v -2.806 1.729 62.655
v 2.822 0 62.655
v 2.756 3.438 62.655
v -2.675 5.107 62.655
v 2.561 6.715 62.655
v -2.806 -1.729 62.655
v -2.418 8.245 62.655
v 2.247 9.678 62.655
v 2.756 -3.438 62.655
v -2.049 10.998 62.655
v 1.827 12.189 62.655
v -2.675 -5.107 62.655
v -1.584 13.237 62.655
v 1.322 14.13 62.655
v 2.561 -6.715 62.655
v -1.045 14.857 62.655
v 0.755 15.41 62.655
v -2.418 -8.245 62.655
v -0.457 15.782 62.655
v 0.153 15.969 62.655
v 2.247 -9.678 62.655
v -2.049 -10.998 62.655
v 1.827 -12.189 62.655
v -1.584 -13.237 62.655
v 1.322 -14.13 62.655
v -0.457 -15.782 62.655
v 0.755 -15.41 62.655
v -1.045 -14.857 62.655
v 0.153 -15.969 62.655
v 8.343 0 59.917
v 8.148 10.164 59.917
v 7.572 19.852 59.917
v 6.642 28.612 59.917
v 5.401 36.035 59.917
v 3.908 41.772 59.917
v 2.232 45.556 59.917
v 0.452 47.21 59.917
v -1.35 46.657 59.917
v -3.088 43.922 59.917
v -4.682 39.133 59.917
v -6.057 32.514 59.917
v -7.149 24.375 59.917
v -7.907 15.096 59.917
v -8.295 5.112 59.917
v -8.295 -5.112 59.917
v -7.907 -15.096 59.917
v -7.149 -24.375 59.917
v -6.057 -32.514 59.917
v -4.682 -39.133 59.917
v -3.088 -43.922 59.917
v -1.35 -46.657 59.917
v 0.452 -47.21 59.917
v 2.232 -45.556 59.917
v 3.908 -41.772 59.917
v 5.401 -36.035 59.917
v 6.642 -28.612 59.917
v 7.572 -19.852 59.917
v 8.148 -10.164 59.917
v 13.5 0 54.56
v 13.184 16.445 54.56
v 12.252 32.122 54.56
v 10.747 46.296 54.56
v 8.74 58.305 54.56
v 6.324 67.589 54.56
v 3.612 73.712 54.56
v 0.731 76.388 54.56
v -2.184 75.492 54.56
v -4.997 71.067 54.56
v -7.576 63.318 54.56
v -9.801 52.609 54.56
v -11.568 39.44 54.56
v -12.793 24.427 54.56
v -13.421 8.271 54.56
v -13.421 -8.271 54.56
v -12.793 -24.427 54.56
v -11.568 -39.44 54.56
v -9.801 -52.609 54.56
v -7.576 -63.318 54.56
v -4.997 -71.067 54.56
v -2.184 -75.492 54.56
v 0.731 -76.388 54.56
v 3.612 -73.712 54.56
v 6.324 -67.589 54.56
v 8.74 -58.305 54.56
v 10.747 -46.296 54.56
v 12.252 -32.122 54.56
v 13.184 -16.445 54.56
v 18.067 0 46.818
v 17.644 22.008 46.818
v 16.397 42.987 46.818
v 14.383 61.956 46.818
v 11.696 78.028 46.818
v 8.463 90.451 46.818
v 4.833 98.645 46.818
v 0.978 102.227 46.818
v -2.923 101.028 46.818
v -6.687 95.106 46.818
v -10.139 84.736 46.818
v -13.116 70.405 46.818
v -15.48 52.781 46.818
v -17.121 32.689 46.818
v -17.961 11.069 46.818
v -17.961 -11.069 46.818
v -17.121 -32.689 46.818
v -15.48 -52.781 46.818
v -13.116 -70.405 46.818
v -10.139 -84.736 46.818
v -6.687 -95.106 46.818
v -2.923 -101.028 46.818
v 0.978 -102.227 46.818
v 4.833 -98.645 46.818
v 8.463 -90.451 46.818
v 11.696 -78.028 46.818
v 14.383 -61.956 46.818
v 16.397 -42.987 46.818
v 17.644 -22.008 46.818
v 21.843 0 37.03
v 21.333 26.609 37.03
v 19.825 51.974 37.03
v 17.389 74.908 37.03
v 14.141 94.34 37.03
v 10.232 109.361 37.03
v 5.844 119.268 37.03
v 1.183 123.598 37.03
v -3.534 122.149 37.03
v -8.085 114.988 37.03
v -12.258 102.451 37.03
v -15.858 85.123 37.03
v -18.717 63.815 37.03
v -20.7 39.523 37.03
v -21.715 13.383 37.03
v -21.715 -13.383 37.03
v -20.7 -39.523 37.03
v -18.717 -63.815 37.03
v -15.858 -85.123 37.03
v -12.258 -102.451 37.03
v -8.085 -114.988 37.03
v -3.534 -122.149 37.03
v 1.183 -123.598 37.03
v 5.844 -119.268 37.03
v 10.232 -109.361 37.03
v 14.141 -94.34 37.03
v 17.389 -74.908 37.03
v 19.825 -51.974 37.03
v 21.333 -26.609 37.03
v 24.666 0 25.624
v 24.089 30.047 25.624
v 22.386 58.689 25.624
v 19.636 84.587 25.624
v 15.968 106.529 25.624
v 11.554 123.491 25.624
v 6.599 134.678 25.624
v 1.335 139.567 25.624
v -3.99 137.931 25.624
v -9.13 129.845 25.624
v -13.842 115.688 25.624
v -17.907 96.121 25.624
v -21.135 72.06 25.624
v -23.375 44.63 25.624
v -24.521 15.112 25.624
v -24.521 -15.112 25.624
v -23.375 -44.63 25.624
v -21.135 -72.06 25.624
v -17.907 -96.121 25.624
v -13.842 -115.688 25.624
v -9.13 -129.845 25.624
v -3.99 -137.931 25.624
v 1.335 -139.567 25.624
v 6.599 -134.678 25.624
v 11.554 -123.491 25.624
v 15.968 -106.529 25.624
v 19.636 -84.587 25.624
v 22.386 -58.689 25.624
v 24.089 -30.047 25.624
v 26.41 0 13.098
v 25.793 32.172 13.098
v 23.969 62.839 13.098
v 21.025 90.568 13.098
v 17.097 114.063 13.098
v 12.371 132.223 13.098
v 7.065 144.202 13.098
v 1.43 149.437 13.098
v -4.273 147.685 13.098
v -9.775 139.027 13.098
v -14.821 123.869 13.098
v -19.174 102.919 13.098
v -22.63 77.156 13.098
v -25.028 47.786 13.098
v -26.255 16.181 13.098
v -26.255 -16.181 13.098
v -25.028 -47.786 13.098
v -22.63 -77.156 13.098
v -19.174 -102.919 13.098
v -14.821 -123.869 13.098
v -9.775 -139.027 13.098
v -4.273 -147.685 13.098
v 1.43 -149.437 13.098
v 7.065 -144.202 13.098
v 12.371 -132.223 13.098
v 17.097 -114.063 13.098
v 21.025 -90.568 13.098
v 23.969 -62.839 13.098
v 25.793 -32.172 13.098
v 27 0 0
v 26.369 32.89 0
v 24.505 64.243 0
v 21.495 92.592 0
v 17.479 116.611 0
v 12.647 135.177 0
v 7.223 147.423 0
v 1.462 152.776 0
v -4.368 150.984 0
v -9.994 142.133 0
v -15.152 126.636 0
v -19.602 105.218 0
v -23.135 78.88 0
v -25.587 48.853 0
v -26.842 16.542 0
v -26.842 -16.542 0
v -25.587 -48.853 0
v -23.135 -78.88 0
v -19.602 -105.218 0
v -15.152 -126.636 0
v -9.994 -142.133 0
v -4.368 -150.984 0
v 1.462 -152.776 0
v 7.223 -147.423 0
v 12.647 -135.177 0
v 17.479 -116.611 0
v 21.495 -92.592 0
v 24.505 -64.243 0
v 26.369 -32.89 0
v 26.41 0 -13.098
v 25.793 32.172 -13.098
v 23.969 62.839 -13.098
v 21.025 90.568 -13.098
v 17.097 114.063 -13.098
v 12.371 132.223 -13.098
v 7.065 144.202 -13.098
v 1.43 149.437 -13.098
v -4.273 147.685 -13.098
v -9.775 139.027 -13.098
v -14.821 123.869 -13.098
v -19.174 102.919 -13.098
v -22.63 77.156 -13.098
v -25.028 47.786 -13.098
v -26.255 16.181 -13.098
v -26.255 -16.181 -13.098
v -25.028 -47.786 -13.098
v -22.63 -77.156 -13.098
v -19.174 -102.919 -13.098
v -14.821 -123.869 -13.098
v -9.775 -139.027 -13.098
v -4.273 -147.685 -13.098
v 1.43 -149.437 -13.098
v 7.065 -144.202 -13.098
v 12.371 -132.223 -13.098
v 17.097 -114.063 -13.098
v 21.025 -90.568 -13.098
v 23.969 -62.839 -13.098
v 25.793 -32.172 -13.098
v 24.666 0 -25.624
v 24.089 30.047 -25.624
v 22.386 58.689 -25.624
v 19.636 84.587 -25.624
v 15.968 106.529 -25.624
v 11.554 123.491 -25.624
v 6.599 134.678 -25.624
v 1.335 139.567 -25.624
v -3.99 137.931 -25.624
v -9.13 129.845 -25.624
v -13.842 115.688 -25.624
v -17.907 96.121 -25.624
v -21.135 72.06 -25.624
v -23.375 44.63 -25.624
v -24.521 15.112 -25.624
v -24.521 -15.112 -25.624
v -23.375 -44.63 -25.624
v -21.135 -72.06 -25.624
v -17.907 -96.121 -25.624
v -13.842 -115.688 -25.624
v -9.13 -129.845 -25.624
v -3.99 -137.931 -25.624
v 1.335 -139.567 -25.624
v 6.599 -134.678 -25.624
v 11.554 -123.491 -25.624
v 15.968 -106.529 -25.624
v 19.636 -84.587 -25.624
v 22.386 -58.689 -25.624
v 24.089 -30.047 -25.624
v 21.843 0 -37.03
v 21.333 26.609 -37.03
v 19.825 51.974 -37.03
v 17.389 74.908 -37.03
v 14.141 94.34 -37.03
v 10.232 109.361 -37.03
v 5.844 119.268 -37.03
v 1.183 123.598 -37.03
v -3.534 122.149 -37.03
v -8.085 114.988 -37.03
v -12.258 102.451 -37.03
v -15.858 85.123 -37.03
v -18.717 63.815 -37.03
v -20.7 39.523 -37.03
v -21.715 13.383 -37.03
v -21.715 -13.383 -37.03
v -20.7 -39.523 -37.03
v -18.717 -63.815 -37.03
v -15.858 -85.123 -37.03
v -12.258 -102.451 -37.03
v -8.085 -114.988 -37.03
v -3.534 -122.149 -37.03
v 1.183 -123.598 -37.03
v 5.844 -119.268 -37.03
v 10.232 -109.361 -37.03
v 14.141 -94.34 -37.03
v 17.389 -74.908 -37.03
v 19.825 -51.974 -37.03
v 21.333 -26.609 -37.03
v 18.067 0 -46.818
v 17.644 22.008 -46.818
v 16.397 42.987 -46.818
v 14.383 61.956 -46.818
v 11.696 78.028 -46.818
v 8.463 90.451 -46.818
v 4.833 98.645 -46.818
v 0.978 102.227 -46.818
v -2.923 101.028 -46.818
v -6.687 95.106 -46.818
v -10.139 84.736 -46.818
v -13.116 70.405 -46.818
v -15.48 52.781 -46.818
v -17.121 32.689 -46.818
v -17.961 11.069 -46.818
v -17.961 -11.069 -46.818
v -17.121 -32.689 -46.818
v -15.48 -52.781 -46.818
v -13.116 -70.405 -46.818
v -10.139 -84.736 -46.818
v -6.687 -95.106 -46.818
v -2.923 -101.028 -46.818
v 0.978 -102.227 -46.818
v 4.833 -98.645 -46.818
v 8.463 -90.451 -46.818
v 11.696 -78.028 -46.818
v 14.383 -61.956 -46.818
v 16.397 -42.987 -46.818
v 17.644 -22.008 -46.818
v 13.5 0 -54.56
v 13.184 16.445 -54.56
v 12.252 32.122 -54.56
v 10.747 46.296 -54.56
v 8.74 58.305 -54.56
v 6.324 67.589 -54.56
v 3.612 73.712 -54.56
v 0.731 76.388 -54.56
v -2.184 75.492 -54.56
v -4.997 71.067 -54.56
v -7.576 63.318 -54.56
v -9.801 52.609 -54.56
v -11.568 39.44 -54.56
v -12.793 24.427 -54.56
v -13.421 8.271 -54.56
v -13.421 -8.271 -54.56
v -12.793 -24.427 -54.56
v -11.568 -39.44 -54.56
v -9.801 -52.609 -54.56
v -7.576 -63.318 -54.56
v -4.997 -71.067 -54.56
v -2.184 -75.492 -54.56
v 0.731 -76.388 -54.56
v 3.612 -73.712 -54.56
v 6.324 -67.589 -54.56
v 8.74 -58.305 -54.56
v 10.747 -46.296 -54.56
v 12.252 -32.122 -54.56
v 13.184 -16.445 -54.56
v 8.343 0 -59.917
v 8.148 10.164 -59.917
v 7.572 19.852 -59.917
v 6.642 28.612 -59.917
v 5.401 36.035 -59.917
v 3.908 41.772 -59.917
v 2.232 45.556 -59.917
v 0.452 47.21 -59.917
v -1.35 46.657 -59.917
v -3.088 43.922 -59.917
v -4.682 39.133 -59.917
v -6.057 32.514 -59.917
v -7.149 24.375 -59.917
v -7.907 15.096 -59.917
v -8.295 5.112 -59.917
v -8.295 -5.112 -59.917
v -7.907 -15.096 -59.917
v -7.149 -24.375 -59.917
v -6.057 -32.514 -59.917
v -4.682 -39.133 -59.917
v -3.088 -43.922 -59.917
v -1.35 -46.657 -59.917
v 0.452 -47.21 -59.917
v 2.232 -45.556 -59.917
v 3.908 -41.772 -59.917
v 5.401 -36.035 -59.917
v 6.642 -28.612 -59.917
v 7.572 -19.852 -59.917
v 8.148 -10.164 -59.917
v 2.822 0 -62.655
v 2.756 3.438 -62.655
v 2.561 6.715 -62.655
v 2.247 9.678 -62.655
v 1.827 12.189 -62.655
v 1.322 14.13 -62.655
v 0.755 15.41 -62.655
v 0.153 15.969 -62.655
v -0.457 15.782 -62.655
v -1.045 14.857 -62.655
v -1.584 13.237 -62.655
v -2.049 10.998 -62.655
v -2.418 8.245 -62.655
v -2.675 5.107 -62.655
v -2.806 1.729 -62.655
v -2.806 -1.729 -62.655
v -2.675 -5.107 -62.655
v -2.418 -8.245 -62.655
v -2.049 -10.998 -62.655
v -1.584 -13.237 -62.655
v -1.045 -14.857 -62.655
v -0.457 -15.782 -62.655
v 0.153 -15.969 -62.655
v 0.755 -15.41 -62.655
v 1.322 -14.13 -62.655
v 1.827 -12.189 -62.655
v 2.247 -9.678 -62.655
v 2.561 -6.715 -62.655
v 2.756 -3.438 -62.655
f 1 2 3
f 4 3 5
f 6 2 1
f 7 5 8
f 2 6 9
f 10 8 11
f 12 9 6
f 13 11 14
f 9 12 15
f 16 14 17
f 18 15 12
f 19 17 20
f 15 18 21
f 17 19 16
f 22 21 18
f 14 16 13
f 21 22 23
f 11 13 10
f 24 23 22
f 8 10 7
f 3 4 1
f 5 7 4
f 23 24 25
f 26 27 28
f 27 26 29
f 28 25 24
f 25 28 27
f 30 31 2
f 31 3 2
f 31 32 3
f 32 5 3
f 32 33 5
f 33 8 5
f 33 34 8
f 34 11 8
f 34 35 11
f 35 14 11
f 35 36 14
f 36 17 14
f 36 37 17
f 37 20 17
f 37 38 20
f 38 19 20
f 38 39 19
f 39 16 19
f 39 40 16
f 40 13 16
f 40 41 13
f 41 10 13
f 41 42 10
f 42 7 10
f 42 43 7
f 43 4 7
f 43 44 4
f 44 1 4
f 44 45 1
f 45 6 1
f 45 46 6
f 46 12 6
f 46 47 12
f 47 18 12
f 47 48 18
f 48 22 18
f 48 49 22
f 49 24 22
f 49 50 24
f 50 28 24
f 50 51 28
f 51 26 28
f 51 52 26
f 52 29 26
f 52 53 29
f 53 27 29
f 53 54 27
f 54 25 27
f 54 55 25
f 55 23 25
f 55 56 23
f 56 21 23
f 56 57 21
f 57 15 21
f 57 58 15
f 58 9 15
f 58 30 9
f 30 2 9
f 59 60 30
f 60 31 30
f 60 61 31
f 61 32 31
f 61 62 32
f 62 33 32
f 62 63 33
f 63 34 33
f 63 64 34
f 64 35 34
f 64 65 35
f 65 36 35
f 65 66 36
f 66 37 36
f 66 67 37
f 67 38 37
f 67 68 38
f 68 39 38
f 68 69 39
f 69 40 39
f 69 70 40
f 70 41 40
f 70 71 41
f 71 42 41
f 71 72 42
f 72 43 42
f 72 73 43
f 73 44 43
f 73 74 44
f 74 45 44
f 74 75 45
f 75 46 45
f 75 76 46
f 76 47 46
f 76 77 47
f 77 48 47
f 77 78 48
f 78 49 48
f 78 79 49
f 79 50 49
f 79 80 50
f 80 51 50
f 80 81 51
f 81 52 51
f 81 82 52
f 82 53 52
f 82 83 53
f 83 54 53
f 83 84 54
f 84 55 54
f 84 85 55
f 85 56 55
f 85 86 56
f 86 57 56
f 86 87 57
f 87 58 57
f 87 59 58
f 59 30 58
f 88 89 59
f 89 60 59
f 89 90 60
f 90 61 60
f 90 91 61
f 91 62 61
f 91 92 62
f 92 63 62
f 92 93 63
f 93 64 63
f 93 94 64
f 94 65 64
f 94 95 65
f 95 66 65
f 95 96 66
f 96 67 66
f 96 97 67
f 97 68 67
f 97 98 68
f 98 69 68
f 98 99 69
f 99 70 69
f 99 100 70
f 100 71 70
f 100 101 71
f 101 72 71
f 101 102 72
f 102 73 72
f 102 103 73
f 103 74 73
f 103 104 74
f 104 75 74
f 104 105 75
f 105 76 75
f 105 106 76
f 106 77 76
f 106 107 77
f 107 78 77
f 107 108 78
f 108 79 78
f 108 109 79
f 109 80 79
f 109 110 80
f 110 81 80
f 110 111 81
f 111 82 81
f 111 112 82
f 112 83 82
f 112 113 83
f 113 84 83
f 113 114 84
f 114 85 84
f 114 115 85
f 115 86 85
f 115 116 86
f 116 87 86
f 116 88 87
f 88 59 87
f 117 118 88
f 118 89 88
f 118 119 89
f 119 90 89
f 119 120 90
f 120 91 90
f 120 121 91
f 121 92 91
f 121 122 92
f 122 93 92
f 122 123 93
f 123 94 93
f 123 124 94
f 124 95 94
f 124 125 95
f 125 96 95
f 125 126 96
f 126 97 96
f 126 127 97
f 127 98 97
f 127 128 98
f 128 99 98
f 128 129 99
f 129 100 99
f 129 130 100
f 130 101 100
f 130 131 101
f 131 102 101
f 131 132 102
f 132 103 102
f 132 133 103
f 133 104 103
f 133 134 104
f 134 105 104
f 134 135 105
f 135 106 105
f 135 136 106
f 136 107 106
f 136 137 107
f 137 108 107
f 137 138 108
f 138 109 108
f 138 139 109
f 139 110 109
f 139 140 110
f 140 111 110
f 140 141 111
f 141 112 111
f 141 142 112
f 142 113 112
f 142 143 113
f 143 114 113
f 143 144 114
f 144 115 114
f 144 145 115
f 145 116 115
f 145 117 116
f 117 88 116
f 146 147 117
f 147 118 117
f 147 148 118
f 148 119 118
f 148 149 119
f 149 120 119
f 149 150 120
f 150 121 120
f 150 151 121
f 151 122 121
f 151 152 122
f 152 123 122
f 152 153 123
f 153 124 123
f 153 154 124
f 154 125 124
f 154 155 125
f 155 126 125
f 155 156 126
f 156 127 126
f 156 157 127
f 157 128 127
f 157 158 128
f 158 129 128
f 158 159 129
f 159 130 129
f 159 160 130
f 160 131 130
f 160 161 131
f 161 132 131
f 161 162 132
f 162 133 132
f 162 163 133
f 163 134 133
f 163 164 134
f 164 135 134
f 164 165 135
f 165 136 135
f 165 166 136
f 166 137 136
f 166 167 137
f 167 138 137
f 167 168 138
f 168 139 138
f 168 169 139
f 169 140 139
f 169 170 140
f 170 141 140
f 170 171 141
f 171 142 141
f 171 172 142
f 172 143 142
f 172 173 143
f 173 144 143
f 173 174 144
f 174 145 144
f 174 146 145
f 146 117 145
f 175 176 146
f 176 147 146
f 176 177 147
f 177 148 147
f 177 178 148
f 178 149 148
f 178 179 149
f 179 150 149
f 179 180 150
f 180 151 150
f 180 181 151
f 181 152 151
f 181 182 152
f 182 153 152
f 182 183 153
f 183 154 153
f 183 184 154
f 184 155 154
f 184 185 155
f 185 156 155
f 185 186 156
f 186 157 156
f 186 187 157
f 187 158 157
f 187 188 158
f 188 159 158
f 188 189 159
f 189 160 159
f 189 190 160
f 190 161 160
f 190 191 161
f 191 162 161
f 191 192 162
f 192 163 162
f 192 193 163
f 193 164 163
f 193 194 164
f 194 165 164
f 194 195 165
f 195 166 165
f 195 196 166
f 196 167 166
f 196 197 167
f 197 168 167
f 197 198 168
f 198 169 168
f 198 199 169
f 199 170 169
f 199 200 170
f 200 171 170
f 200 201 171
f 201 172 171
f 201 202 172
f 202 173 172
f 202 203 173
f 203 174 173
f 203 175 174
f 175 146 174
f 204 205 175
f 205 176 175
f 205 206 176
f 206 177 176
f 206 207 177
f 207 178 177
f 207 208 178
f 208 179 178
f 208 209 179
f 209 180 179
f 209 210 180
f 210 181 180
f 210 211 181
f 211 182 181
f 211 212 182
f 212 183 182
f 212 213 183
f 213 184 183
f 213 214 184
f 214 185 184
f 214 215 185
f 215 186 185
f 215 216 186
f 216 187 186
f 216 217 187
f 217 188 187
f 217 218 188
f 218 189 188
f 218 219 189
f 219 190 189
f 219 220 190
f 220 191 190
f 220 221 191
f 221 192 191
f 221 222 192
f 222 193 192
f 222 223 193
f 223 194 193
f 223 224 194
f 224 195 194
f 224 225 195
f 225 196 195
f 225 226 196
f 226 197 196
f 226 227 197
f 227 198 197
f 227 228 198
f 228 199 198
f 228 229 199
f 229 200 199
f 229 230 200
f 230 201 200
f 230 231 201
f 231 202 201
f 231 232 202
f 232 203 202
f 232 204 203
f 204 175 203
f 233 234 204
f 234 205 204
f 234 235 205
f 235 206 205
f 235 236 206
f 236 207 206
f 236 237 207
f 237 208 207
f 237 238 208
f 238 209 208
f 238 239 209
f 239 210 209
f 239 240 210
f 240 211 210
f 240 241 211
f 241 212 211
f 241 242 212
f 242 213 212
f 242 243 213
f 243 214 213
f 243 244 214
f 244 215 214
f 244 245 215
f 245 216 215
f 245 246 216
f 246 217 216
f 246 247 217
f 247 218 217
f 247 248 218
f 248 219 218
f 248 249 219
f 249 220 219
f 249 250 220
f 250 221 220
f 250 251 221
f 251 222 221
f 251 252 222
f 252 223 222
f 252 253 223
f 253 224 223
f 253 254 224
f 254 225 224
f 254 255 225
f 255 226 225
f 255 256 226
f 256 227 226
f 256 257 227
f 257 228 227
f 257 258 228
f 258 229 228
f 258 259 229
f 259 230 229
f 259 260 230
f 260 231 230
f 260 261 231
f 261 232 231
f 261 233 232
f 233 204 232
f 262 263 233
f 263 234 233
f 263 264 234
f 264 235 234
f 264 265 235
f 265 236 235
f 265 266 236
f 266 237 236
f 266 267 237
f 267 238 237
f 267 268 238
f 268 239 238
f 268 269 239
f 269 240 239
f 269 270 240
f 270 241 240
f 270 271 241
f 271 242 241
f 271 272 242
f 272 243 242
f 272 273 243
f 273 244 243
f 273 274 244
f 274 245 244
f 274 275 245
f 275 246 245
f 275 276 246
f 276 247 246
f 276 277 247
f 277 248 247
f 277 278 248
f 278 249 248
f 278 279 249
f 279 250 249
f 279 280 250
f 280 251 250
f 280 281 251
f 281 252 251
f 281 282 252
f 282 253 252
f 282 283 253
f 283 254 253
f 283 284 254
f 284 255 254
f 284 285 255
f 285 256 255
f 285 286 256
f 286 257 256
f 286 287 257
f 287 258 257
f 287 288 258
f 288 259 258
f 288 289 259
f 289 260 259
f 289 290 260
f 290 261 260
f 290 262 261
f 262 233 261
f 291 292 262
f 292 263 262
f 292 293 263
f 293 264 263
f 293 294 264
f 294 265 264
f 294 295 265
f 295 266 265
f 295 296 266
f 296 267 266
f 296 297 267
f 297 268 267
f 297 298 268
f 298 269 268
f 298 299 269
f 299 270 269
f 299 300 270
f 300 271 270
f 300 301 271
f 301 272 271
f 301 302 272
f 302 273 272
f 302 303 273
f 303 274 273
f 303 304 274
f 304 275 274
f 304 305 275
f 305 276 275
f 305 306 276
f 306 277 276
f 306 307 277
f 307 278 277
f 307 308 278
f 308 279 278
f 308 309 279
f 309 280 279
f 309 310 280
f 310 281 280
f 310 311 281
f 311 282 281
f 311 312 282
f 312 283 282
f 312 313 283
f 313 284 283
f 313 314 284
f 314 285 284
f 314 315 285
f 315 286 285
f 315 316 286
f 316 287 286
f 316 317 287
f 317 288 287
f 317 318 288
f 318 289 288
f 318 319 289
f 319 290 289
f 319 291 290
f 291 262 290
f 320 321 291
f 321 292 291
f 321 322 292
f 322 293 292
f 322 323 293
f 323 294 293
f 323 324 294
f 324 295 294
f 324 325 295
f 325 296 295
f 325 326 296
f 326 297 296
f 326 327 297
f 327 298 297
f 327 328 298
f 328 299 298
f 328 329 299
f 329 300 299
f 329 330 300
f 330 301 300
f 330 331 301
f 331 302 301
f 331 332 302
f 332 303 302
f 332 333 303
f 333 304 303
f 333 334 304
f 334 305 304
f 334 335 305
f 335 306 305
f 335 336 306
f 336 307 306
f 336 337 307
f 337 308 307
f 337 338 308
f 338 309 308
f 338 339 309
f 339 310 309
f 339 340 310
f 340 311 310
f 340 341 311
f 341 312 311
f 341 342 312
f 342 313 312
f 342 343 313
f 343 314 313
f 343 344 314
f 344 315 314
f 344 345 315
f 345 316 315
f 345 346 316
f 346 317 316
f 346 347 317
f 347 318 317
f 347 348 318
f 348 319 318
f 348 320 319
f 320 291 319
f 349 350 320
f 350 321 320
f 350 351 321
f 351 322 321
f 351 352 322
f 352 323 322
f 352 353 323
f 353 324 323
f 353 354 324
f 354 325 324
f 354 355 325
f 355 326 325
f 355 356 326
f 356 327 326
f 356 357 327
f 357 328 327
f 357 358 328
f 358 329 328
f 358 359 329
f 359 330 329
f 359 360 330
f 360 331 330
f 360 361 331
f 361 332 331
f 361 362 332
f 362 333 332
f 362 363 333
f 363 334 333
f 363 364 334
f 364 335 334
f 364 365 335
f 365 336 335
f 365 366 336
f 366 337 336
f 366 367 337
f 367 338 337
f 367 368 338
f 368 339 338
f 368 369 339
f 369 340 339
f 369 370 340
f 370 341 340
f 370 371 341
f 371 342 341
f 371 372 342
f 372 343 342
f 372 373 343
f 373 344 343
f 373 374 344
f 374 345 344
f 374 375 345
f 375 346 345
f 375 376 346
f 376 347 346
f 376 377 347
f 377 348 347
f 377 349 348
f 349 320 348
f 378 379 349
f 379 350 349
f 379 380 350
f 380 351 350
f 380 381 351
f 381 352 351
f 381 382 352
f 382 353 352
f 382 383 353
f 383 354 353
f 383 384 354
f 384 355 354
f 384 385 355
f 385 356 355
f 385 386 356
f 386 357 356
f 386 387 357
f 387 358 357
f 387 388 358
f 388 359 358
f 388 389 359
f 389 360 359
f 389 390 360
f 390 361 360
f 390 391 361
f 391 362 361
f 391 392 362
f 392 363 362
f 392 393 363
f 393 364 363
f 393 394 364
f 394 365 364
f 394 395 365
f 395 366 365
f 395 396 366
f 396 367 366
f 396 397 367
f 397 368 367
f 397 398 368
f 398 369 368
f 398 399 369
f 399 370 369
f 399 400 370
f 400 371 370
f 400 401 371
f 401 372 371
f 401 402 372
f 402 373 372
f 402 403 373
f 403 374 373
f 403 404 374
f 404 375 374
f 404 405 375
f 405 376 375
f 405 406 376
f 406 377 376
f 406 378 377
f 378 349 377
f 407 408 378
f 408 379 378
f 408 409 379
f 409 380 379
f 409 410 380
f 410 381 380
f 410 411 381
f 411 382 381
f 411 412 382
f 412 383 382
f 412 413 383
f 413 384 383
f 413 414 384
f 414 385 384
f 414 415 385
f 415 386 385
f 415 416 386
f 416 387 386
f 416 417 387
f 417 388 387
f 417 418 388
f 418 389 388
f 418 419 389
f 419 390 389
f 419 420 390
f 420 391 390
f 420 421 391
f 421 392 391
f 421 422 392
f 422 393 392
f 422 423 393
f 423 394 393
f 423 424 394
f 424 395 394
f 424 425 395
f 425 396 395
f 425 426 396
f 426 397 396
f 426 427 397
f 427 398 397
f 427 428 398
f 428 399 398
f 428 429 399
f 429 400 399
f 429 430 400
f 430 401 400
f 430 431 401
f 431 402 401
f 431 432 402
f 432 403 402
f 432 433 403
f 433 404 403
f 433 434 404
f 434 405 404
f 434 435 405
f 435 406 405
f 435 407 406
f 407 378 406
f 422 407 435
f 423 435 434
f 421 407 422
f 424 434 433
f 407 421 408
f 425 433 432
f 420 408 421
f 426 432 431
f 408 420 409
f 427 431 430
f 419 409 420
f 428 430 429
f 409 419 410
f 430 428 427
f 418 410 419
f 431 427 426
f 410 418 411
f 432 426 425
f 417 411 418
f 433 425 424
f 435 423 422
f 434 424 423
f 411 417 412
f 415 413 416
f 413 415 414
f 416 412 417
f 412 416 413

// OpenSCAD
// Generated by SolidPython 1.0.1 on 2020-07-29 00:46:45


scale(v = [3, 17, 7]) {
	sphere(r = 9);
}
/***********************************************
*********      SolidPython code:      **********
************************************************
 
# import packages: SolidPython
from solid import *
from solid.utils import *
from itertools import chain, combinations, permutations


class Resize:

    def __init__(self, scad_file):
        self.scad_file = scad_file
        #self.scad_file = import_scad(scad_file)
        # cone/cylinder param:
        self.r1 = 0
        self.r2 = 0
        self.h = 0
        # rectangular prism param:
        self.w = 0
        self.l = 0
        # ellipse param:
        self.r = 0

    # import OpenScad code (file name corresponds to shape)


    # classify shape + parameters
    def assign(self, param1, param2, param3):
        if self.scad_file == 'cone.scad':
            self.r1 = param1
            self.r2 = param2
            self.h = param3
        elif self.scad_file == 'cylinder.scad':
            self.r1 = param1
            self.r2 = param2
            self.h = param3
        elif self.scad_file == 'rectangularPrism.scad':
            self.h = param1
            self.l = param2
            self.w = param3
        else:
            self.r = param1
            self.h = param2

    # resize parameters
    def iterate(self):
        x = range(3, 20, 2)
        i = 1
        if self.scad_file == 'cone.scad':
            tempList = list(permutations(x, 2))
            for temp in tempList:
                param1 = temp[0]
                param2 = temp[1]
                filepath = 'produced_scad_files/' + 'cone' + str(param1) + '_' + str(param2) + '_' + '.scad'
                scad_render_to_file(cylinder(h=param1, r1=param2, r2=0), filepath)

        elif self.scad_file == 'cylinder.scad':
            tempList = list(permutations(x, 3))
            for temp in tempList:
                param1 = temp[0]
                param2 = temp[1]
                filepath = 'produced_scad_files/' + 'cylinder' + str(param1) + '_' + str(param2) + '_' + '.scad'
                scad_render_to_file(cylinder(h=param1, r1=param2, r2=param2), filepath)

        elif self.scad_file == 'rectangularPrism.scad':
            tempList = list(permutations(x, 3))
            for temp in tempList:
                param1 = temp[0]
                param2 = temp[1]
                param3 = temp[2]
                filepath = 'produced_scad_files/' + 'rectangularPrism' + str(param1) + '_' + str(param2) + '_' + str(
                    param3) + '.scad'
                scad_render_to_file(cube(size=(param1, param2, param3)), filepath)

        elif self.scad_file == 'ellipse.scad':
            tempList = list(permutations(x, 4))
            for temp in tempList:
                param1 = temp[0]
                param2 = temp[1]
                param3 = temp[2]
                param4 = temp[3]
                filepath = 'produced_scad_files/' + 'ellipse' + str(param1) + '_' + str(param2) + '_' + str(param3) + '_' + str(param4) + '.scad'
                scad_render_to_file(scale([param1, param2, param3])(sphere(r=param4)), filepath)

    def render_to_scadfile(self):
        scad_render_to_file(scad, 'example.scad') 
 
************************************************/
